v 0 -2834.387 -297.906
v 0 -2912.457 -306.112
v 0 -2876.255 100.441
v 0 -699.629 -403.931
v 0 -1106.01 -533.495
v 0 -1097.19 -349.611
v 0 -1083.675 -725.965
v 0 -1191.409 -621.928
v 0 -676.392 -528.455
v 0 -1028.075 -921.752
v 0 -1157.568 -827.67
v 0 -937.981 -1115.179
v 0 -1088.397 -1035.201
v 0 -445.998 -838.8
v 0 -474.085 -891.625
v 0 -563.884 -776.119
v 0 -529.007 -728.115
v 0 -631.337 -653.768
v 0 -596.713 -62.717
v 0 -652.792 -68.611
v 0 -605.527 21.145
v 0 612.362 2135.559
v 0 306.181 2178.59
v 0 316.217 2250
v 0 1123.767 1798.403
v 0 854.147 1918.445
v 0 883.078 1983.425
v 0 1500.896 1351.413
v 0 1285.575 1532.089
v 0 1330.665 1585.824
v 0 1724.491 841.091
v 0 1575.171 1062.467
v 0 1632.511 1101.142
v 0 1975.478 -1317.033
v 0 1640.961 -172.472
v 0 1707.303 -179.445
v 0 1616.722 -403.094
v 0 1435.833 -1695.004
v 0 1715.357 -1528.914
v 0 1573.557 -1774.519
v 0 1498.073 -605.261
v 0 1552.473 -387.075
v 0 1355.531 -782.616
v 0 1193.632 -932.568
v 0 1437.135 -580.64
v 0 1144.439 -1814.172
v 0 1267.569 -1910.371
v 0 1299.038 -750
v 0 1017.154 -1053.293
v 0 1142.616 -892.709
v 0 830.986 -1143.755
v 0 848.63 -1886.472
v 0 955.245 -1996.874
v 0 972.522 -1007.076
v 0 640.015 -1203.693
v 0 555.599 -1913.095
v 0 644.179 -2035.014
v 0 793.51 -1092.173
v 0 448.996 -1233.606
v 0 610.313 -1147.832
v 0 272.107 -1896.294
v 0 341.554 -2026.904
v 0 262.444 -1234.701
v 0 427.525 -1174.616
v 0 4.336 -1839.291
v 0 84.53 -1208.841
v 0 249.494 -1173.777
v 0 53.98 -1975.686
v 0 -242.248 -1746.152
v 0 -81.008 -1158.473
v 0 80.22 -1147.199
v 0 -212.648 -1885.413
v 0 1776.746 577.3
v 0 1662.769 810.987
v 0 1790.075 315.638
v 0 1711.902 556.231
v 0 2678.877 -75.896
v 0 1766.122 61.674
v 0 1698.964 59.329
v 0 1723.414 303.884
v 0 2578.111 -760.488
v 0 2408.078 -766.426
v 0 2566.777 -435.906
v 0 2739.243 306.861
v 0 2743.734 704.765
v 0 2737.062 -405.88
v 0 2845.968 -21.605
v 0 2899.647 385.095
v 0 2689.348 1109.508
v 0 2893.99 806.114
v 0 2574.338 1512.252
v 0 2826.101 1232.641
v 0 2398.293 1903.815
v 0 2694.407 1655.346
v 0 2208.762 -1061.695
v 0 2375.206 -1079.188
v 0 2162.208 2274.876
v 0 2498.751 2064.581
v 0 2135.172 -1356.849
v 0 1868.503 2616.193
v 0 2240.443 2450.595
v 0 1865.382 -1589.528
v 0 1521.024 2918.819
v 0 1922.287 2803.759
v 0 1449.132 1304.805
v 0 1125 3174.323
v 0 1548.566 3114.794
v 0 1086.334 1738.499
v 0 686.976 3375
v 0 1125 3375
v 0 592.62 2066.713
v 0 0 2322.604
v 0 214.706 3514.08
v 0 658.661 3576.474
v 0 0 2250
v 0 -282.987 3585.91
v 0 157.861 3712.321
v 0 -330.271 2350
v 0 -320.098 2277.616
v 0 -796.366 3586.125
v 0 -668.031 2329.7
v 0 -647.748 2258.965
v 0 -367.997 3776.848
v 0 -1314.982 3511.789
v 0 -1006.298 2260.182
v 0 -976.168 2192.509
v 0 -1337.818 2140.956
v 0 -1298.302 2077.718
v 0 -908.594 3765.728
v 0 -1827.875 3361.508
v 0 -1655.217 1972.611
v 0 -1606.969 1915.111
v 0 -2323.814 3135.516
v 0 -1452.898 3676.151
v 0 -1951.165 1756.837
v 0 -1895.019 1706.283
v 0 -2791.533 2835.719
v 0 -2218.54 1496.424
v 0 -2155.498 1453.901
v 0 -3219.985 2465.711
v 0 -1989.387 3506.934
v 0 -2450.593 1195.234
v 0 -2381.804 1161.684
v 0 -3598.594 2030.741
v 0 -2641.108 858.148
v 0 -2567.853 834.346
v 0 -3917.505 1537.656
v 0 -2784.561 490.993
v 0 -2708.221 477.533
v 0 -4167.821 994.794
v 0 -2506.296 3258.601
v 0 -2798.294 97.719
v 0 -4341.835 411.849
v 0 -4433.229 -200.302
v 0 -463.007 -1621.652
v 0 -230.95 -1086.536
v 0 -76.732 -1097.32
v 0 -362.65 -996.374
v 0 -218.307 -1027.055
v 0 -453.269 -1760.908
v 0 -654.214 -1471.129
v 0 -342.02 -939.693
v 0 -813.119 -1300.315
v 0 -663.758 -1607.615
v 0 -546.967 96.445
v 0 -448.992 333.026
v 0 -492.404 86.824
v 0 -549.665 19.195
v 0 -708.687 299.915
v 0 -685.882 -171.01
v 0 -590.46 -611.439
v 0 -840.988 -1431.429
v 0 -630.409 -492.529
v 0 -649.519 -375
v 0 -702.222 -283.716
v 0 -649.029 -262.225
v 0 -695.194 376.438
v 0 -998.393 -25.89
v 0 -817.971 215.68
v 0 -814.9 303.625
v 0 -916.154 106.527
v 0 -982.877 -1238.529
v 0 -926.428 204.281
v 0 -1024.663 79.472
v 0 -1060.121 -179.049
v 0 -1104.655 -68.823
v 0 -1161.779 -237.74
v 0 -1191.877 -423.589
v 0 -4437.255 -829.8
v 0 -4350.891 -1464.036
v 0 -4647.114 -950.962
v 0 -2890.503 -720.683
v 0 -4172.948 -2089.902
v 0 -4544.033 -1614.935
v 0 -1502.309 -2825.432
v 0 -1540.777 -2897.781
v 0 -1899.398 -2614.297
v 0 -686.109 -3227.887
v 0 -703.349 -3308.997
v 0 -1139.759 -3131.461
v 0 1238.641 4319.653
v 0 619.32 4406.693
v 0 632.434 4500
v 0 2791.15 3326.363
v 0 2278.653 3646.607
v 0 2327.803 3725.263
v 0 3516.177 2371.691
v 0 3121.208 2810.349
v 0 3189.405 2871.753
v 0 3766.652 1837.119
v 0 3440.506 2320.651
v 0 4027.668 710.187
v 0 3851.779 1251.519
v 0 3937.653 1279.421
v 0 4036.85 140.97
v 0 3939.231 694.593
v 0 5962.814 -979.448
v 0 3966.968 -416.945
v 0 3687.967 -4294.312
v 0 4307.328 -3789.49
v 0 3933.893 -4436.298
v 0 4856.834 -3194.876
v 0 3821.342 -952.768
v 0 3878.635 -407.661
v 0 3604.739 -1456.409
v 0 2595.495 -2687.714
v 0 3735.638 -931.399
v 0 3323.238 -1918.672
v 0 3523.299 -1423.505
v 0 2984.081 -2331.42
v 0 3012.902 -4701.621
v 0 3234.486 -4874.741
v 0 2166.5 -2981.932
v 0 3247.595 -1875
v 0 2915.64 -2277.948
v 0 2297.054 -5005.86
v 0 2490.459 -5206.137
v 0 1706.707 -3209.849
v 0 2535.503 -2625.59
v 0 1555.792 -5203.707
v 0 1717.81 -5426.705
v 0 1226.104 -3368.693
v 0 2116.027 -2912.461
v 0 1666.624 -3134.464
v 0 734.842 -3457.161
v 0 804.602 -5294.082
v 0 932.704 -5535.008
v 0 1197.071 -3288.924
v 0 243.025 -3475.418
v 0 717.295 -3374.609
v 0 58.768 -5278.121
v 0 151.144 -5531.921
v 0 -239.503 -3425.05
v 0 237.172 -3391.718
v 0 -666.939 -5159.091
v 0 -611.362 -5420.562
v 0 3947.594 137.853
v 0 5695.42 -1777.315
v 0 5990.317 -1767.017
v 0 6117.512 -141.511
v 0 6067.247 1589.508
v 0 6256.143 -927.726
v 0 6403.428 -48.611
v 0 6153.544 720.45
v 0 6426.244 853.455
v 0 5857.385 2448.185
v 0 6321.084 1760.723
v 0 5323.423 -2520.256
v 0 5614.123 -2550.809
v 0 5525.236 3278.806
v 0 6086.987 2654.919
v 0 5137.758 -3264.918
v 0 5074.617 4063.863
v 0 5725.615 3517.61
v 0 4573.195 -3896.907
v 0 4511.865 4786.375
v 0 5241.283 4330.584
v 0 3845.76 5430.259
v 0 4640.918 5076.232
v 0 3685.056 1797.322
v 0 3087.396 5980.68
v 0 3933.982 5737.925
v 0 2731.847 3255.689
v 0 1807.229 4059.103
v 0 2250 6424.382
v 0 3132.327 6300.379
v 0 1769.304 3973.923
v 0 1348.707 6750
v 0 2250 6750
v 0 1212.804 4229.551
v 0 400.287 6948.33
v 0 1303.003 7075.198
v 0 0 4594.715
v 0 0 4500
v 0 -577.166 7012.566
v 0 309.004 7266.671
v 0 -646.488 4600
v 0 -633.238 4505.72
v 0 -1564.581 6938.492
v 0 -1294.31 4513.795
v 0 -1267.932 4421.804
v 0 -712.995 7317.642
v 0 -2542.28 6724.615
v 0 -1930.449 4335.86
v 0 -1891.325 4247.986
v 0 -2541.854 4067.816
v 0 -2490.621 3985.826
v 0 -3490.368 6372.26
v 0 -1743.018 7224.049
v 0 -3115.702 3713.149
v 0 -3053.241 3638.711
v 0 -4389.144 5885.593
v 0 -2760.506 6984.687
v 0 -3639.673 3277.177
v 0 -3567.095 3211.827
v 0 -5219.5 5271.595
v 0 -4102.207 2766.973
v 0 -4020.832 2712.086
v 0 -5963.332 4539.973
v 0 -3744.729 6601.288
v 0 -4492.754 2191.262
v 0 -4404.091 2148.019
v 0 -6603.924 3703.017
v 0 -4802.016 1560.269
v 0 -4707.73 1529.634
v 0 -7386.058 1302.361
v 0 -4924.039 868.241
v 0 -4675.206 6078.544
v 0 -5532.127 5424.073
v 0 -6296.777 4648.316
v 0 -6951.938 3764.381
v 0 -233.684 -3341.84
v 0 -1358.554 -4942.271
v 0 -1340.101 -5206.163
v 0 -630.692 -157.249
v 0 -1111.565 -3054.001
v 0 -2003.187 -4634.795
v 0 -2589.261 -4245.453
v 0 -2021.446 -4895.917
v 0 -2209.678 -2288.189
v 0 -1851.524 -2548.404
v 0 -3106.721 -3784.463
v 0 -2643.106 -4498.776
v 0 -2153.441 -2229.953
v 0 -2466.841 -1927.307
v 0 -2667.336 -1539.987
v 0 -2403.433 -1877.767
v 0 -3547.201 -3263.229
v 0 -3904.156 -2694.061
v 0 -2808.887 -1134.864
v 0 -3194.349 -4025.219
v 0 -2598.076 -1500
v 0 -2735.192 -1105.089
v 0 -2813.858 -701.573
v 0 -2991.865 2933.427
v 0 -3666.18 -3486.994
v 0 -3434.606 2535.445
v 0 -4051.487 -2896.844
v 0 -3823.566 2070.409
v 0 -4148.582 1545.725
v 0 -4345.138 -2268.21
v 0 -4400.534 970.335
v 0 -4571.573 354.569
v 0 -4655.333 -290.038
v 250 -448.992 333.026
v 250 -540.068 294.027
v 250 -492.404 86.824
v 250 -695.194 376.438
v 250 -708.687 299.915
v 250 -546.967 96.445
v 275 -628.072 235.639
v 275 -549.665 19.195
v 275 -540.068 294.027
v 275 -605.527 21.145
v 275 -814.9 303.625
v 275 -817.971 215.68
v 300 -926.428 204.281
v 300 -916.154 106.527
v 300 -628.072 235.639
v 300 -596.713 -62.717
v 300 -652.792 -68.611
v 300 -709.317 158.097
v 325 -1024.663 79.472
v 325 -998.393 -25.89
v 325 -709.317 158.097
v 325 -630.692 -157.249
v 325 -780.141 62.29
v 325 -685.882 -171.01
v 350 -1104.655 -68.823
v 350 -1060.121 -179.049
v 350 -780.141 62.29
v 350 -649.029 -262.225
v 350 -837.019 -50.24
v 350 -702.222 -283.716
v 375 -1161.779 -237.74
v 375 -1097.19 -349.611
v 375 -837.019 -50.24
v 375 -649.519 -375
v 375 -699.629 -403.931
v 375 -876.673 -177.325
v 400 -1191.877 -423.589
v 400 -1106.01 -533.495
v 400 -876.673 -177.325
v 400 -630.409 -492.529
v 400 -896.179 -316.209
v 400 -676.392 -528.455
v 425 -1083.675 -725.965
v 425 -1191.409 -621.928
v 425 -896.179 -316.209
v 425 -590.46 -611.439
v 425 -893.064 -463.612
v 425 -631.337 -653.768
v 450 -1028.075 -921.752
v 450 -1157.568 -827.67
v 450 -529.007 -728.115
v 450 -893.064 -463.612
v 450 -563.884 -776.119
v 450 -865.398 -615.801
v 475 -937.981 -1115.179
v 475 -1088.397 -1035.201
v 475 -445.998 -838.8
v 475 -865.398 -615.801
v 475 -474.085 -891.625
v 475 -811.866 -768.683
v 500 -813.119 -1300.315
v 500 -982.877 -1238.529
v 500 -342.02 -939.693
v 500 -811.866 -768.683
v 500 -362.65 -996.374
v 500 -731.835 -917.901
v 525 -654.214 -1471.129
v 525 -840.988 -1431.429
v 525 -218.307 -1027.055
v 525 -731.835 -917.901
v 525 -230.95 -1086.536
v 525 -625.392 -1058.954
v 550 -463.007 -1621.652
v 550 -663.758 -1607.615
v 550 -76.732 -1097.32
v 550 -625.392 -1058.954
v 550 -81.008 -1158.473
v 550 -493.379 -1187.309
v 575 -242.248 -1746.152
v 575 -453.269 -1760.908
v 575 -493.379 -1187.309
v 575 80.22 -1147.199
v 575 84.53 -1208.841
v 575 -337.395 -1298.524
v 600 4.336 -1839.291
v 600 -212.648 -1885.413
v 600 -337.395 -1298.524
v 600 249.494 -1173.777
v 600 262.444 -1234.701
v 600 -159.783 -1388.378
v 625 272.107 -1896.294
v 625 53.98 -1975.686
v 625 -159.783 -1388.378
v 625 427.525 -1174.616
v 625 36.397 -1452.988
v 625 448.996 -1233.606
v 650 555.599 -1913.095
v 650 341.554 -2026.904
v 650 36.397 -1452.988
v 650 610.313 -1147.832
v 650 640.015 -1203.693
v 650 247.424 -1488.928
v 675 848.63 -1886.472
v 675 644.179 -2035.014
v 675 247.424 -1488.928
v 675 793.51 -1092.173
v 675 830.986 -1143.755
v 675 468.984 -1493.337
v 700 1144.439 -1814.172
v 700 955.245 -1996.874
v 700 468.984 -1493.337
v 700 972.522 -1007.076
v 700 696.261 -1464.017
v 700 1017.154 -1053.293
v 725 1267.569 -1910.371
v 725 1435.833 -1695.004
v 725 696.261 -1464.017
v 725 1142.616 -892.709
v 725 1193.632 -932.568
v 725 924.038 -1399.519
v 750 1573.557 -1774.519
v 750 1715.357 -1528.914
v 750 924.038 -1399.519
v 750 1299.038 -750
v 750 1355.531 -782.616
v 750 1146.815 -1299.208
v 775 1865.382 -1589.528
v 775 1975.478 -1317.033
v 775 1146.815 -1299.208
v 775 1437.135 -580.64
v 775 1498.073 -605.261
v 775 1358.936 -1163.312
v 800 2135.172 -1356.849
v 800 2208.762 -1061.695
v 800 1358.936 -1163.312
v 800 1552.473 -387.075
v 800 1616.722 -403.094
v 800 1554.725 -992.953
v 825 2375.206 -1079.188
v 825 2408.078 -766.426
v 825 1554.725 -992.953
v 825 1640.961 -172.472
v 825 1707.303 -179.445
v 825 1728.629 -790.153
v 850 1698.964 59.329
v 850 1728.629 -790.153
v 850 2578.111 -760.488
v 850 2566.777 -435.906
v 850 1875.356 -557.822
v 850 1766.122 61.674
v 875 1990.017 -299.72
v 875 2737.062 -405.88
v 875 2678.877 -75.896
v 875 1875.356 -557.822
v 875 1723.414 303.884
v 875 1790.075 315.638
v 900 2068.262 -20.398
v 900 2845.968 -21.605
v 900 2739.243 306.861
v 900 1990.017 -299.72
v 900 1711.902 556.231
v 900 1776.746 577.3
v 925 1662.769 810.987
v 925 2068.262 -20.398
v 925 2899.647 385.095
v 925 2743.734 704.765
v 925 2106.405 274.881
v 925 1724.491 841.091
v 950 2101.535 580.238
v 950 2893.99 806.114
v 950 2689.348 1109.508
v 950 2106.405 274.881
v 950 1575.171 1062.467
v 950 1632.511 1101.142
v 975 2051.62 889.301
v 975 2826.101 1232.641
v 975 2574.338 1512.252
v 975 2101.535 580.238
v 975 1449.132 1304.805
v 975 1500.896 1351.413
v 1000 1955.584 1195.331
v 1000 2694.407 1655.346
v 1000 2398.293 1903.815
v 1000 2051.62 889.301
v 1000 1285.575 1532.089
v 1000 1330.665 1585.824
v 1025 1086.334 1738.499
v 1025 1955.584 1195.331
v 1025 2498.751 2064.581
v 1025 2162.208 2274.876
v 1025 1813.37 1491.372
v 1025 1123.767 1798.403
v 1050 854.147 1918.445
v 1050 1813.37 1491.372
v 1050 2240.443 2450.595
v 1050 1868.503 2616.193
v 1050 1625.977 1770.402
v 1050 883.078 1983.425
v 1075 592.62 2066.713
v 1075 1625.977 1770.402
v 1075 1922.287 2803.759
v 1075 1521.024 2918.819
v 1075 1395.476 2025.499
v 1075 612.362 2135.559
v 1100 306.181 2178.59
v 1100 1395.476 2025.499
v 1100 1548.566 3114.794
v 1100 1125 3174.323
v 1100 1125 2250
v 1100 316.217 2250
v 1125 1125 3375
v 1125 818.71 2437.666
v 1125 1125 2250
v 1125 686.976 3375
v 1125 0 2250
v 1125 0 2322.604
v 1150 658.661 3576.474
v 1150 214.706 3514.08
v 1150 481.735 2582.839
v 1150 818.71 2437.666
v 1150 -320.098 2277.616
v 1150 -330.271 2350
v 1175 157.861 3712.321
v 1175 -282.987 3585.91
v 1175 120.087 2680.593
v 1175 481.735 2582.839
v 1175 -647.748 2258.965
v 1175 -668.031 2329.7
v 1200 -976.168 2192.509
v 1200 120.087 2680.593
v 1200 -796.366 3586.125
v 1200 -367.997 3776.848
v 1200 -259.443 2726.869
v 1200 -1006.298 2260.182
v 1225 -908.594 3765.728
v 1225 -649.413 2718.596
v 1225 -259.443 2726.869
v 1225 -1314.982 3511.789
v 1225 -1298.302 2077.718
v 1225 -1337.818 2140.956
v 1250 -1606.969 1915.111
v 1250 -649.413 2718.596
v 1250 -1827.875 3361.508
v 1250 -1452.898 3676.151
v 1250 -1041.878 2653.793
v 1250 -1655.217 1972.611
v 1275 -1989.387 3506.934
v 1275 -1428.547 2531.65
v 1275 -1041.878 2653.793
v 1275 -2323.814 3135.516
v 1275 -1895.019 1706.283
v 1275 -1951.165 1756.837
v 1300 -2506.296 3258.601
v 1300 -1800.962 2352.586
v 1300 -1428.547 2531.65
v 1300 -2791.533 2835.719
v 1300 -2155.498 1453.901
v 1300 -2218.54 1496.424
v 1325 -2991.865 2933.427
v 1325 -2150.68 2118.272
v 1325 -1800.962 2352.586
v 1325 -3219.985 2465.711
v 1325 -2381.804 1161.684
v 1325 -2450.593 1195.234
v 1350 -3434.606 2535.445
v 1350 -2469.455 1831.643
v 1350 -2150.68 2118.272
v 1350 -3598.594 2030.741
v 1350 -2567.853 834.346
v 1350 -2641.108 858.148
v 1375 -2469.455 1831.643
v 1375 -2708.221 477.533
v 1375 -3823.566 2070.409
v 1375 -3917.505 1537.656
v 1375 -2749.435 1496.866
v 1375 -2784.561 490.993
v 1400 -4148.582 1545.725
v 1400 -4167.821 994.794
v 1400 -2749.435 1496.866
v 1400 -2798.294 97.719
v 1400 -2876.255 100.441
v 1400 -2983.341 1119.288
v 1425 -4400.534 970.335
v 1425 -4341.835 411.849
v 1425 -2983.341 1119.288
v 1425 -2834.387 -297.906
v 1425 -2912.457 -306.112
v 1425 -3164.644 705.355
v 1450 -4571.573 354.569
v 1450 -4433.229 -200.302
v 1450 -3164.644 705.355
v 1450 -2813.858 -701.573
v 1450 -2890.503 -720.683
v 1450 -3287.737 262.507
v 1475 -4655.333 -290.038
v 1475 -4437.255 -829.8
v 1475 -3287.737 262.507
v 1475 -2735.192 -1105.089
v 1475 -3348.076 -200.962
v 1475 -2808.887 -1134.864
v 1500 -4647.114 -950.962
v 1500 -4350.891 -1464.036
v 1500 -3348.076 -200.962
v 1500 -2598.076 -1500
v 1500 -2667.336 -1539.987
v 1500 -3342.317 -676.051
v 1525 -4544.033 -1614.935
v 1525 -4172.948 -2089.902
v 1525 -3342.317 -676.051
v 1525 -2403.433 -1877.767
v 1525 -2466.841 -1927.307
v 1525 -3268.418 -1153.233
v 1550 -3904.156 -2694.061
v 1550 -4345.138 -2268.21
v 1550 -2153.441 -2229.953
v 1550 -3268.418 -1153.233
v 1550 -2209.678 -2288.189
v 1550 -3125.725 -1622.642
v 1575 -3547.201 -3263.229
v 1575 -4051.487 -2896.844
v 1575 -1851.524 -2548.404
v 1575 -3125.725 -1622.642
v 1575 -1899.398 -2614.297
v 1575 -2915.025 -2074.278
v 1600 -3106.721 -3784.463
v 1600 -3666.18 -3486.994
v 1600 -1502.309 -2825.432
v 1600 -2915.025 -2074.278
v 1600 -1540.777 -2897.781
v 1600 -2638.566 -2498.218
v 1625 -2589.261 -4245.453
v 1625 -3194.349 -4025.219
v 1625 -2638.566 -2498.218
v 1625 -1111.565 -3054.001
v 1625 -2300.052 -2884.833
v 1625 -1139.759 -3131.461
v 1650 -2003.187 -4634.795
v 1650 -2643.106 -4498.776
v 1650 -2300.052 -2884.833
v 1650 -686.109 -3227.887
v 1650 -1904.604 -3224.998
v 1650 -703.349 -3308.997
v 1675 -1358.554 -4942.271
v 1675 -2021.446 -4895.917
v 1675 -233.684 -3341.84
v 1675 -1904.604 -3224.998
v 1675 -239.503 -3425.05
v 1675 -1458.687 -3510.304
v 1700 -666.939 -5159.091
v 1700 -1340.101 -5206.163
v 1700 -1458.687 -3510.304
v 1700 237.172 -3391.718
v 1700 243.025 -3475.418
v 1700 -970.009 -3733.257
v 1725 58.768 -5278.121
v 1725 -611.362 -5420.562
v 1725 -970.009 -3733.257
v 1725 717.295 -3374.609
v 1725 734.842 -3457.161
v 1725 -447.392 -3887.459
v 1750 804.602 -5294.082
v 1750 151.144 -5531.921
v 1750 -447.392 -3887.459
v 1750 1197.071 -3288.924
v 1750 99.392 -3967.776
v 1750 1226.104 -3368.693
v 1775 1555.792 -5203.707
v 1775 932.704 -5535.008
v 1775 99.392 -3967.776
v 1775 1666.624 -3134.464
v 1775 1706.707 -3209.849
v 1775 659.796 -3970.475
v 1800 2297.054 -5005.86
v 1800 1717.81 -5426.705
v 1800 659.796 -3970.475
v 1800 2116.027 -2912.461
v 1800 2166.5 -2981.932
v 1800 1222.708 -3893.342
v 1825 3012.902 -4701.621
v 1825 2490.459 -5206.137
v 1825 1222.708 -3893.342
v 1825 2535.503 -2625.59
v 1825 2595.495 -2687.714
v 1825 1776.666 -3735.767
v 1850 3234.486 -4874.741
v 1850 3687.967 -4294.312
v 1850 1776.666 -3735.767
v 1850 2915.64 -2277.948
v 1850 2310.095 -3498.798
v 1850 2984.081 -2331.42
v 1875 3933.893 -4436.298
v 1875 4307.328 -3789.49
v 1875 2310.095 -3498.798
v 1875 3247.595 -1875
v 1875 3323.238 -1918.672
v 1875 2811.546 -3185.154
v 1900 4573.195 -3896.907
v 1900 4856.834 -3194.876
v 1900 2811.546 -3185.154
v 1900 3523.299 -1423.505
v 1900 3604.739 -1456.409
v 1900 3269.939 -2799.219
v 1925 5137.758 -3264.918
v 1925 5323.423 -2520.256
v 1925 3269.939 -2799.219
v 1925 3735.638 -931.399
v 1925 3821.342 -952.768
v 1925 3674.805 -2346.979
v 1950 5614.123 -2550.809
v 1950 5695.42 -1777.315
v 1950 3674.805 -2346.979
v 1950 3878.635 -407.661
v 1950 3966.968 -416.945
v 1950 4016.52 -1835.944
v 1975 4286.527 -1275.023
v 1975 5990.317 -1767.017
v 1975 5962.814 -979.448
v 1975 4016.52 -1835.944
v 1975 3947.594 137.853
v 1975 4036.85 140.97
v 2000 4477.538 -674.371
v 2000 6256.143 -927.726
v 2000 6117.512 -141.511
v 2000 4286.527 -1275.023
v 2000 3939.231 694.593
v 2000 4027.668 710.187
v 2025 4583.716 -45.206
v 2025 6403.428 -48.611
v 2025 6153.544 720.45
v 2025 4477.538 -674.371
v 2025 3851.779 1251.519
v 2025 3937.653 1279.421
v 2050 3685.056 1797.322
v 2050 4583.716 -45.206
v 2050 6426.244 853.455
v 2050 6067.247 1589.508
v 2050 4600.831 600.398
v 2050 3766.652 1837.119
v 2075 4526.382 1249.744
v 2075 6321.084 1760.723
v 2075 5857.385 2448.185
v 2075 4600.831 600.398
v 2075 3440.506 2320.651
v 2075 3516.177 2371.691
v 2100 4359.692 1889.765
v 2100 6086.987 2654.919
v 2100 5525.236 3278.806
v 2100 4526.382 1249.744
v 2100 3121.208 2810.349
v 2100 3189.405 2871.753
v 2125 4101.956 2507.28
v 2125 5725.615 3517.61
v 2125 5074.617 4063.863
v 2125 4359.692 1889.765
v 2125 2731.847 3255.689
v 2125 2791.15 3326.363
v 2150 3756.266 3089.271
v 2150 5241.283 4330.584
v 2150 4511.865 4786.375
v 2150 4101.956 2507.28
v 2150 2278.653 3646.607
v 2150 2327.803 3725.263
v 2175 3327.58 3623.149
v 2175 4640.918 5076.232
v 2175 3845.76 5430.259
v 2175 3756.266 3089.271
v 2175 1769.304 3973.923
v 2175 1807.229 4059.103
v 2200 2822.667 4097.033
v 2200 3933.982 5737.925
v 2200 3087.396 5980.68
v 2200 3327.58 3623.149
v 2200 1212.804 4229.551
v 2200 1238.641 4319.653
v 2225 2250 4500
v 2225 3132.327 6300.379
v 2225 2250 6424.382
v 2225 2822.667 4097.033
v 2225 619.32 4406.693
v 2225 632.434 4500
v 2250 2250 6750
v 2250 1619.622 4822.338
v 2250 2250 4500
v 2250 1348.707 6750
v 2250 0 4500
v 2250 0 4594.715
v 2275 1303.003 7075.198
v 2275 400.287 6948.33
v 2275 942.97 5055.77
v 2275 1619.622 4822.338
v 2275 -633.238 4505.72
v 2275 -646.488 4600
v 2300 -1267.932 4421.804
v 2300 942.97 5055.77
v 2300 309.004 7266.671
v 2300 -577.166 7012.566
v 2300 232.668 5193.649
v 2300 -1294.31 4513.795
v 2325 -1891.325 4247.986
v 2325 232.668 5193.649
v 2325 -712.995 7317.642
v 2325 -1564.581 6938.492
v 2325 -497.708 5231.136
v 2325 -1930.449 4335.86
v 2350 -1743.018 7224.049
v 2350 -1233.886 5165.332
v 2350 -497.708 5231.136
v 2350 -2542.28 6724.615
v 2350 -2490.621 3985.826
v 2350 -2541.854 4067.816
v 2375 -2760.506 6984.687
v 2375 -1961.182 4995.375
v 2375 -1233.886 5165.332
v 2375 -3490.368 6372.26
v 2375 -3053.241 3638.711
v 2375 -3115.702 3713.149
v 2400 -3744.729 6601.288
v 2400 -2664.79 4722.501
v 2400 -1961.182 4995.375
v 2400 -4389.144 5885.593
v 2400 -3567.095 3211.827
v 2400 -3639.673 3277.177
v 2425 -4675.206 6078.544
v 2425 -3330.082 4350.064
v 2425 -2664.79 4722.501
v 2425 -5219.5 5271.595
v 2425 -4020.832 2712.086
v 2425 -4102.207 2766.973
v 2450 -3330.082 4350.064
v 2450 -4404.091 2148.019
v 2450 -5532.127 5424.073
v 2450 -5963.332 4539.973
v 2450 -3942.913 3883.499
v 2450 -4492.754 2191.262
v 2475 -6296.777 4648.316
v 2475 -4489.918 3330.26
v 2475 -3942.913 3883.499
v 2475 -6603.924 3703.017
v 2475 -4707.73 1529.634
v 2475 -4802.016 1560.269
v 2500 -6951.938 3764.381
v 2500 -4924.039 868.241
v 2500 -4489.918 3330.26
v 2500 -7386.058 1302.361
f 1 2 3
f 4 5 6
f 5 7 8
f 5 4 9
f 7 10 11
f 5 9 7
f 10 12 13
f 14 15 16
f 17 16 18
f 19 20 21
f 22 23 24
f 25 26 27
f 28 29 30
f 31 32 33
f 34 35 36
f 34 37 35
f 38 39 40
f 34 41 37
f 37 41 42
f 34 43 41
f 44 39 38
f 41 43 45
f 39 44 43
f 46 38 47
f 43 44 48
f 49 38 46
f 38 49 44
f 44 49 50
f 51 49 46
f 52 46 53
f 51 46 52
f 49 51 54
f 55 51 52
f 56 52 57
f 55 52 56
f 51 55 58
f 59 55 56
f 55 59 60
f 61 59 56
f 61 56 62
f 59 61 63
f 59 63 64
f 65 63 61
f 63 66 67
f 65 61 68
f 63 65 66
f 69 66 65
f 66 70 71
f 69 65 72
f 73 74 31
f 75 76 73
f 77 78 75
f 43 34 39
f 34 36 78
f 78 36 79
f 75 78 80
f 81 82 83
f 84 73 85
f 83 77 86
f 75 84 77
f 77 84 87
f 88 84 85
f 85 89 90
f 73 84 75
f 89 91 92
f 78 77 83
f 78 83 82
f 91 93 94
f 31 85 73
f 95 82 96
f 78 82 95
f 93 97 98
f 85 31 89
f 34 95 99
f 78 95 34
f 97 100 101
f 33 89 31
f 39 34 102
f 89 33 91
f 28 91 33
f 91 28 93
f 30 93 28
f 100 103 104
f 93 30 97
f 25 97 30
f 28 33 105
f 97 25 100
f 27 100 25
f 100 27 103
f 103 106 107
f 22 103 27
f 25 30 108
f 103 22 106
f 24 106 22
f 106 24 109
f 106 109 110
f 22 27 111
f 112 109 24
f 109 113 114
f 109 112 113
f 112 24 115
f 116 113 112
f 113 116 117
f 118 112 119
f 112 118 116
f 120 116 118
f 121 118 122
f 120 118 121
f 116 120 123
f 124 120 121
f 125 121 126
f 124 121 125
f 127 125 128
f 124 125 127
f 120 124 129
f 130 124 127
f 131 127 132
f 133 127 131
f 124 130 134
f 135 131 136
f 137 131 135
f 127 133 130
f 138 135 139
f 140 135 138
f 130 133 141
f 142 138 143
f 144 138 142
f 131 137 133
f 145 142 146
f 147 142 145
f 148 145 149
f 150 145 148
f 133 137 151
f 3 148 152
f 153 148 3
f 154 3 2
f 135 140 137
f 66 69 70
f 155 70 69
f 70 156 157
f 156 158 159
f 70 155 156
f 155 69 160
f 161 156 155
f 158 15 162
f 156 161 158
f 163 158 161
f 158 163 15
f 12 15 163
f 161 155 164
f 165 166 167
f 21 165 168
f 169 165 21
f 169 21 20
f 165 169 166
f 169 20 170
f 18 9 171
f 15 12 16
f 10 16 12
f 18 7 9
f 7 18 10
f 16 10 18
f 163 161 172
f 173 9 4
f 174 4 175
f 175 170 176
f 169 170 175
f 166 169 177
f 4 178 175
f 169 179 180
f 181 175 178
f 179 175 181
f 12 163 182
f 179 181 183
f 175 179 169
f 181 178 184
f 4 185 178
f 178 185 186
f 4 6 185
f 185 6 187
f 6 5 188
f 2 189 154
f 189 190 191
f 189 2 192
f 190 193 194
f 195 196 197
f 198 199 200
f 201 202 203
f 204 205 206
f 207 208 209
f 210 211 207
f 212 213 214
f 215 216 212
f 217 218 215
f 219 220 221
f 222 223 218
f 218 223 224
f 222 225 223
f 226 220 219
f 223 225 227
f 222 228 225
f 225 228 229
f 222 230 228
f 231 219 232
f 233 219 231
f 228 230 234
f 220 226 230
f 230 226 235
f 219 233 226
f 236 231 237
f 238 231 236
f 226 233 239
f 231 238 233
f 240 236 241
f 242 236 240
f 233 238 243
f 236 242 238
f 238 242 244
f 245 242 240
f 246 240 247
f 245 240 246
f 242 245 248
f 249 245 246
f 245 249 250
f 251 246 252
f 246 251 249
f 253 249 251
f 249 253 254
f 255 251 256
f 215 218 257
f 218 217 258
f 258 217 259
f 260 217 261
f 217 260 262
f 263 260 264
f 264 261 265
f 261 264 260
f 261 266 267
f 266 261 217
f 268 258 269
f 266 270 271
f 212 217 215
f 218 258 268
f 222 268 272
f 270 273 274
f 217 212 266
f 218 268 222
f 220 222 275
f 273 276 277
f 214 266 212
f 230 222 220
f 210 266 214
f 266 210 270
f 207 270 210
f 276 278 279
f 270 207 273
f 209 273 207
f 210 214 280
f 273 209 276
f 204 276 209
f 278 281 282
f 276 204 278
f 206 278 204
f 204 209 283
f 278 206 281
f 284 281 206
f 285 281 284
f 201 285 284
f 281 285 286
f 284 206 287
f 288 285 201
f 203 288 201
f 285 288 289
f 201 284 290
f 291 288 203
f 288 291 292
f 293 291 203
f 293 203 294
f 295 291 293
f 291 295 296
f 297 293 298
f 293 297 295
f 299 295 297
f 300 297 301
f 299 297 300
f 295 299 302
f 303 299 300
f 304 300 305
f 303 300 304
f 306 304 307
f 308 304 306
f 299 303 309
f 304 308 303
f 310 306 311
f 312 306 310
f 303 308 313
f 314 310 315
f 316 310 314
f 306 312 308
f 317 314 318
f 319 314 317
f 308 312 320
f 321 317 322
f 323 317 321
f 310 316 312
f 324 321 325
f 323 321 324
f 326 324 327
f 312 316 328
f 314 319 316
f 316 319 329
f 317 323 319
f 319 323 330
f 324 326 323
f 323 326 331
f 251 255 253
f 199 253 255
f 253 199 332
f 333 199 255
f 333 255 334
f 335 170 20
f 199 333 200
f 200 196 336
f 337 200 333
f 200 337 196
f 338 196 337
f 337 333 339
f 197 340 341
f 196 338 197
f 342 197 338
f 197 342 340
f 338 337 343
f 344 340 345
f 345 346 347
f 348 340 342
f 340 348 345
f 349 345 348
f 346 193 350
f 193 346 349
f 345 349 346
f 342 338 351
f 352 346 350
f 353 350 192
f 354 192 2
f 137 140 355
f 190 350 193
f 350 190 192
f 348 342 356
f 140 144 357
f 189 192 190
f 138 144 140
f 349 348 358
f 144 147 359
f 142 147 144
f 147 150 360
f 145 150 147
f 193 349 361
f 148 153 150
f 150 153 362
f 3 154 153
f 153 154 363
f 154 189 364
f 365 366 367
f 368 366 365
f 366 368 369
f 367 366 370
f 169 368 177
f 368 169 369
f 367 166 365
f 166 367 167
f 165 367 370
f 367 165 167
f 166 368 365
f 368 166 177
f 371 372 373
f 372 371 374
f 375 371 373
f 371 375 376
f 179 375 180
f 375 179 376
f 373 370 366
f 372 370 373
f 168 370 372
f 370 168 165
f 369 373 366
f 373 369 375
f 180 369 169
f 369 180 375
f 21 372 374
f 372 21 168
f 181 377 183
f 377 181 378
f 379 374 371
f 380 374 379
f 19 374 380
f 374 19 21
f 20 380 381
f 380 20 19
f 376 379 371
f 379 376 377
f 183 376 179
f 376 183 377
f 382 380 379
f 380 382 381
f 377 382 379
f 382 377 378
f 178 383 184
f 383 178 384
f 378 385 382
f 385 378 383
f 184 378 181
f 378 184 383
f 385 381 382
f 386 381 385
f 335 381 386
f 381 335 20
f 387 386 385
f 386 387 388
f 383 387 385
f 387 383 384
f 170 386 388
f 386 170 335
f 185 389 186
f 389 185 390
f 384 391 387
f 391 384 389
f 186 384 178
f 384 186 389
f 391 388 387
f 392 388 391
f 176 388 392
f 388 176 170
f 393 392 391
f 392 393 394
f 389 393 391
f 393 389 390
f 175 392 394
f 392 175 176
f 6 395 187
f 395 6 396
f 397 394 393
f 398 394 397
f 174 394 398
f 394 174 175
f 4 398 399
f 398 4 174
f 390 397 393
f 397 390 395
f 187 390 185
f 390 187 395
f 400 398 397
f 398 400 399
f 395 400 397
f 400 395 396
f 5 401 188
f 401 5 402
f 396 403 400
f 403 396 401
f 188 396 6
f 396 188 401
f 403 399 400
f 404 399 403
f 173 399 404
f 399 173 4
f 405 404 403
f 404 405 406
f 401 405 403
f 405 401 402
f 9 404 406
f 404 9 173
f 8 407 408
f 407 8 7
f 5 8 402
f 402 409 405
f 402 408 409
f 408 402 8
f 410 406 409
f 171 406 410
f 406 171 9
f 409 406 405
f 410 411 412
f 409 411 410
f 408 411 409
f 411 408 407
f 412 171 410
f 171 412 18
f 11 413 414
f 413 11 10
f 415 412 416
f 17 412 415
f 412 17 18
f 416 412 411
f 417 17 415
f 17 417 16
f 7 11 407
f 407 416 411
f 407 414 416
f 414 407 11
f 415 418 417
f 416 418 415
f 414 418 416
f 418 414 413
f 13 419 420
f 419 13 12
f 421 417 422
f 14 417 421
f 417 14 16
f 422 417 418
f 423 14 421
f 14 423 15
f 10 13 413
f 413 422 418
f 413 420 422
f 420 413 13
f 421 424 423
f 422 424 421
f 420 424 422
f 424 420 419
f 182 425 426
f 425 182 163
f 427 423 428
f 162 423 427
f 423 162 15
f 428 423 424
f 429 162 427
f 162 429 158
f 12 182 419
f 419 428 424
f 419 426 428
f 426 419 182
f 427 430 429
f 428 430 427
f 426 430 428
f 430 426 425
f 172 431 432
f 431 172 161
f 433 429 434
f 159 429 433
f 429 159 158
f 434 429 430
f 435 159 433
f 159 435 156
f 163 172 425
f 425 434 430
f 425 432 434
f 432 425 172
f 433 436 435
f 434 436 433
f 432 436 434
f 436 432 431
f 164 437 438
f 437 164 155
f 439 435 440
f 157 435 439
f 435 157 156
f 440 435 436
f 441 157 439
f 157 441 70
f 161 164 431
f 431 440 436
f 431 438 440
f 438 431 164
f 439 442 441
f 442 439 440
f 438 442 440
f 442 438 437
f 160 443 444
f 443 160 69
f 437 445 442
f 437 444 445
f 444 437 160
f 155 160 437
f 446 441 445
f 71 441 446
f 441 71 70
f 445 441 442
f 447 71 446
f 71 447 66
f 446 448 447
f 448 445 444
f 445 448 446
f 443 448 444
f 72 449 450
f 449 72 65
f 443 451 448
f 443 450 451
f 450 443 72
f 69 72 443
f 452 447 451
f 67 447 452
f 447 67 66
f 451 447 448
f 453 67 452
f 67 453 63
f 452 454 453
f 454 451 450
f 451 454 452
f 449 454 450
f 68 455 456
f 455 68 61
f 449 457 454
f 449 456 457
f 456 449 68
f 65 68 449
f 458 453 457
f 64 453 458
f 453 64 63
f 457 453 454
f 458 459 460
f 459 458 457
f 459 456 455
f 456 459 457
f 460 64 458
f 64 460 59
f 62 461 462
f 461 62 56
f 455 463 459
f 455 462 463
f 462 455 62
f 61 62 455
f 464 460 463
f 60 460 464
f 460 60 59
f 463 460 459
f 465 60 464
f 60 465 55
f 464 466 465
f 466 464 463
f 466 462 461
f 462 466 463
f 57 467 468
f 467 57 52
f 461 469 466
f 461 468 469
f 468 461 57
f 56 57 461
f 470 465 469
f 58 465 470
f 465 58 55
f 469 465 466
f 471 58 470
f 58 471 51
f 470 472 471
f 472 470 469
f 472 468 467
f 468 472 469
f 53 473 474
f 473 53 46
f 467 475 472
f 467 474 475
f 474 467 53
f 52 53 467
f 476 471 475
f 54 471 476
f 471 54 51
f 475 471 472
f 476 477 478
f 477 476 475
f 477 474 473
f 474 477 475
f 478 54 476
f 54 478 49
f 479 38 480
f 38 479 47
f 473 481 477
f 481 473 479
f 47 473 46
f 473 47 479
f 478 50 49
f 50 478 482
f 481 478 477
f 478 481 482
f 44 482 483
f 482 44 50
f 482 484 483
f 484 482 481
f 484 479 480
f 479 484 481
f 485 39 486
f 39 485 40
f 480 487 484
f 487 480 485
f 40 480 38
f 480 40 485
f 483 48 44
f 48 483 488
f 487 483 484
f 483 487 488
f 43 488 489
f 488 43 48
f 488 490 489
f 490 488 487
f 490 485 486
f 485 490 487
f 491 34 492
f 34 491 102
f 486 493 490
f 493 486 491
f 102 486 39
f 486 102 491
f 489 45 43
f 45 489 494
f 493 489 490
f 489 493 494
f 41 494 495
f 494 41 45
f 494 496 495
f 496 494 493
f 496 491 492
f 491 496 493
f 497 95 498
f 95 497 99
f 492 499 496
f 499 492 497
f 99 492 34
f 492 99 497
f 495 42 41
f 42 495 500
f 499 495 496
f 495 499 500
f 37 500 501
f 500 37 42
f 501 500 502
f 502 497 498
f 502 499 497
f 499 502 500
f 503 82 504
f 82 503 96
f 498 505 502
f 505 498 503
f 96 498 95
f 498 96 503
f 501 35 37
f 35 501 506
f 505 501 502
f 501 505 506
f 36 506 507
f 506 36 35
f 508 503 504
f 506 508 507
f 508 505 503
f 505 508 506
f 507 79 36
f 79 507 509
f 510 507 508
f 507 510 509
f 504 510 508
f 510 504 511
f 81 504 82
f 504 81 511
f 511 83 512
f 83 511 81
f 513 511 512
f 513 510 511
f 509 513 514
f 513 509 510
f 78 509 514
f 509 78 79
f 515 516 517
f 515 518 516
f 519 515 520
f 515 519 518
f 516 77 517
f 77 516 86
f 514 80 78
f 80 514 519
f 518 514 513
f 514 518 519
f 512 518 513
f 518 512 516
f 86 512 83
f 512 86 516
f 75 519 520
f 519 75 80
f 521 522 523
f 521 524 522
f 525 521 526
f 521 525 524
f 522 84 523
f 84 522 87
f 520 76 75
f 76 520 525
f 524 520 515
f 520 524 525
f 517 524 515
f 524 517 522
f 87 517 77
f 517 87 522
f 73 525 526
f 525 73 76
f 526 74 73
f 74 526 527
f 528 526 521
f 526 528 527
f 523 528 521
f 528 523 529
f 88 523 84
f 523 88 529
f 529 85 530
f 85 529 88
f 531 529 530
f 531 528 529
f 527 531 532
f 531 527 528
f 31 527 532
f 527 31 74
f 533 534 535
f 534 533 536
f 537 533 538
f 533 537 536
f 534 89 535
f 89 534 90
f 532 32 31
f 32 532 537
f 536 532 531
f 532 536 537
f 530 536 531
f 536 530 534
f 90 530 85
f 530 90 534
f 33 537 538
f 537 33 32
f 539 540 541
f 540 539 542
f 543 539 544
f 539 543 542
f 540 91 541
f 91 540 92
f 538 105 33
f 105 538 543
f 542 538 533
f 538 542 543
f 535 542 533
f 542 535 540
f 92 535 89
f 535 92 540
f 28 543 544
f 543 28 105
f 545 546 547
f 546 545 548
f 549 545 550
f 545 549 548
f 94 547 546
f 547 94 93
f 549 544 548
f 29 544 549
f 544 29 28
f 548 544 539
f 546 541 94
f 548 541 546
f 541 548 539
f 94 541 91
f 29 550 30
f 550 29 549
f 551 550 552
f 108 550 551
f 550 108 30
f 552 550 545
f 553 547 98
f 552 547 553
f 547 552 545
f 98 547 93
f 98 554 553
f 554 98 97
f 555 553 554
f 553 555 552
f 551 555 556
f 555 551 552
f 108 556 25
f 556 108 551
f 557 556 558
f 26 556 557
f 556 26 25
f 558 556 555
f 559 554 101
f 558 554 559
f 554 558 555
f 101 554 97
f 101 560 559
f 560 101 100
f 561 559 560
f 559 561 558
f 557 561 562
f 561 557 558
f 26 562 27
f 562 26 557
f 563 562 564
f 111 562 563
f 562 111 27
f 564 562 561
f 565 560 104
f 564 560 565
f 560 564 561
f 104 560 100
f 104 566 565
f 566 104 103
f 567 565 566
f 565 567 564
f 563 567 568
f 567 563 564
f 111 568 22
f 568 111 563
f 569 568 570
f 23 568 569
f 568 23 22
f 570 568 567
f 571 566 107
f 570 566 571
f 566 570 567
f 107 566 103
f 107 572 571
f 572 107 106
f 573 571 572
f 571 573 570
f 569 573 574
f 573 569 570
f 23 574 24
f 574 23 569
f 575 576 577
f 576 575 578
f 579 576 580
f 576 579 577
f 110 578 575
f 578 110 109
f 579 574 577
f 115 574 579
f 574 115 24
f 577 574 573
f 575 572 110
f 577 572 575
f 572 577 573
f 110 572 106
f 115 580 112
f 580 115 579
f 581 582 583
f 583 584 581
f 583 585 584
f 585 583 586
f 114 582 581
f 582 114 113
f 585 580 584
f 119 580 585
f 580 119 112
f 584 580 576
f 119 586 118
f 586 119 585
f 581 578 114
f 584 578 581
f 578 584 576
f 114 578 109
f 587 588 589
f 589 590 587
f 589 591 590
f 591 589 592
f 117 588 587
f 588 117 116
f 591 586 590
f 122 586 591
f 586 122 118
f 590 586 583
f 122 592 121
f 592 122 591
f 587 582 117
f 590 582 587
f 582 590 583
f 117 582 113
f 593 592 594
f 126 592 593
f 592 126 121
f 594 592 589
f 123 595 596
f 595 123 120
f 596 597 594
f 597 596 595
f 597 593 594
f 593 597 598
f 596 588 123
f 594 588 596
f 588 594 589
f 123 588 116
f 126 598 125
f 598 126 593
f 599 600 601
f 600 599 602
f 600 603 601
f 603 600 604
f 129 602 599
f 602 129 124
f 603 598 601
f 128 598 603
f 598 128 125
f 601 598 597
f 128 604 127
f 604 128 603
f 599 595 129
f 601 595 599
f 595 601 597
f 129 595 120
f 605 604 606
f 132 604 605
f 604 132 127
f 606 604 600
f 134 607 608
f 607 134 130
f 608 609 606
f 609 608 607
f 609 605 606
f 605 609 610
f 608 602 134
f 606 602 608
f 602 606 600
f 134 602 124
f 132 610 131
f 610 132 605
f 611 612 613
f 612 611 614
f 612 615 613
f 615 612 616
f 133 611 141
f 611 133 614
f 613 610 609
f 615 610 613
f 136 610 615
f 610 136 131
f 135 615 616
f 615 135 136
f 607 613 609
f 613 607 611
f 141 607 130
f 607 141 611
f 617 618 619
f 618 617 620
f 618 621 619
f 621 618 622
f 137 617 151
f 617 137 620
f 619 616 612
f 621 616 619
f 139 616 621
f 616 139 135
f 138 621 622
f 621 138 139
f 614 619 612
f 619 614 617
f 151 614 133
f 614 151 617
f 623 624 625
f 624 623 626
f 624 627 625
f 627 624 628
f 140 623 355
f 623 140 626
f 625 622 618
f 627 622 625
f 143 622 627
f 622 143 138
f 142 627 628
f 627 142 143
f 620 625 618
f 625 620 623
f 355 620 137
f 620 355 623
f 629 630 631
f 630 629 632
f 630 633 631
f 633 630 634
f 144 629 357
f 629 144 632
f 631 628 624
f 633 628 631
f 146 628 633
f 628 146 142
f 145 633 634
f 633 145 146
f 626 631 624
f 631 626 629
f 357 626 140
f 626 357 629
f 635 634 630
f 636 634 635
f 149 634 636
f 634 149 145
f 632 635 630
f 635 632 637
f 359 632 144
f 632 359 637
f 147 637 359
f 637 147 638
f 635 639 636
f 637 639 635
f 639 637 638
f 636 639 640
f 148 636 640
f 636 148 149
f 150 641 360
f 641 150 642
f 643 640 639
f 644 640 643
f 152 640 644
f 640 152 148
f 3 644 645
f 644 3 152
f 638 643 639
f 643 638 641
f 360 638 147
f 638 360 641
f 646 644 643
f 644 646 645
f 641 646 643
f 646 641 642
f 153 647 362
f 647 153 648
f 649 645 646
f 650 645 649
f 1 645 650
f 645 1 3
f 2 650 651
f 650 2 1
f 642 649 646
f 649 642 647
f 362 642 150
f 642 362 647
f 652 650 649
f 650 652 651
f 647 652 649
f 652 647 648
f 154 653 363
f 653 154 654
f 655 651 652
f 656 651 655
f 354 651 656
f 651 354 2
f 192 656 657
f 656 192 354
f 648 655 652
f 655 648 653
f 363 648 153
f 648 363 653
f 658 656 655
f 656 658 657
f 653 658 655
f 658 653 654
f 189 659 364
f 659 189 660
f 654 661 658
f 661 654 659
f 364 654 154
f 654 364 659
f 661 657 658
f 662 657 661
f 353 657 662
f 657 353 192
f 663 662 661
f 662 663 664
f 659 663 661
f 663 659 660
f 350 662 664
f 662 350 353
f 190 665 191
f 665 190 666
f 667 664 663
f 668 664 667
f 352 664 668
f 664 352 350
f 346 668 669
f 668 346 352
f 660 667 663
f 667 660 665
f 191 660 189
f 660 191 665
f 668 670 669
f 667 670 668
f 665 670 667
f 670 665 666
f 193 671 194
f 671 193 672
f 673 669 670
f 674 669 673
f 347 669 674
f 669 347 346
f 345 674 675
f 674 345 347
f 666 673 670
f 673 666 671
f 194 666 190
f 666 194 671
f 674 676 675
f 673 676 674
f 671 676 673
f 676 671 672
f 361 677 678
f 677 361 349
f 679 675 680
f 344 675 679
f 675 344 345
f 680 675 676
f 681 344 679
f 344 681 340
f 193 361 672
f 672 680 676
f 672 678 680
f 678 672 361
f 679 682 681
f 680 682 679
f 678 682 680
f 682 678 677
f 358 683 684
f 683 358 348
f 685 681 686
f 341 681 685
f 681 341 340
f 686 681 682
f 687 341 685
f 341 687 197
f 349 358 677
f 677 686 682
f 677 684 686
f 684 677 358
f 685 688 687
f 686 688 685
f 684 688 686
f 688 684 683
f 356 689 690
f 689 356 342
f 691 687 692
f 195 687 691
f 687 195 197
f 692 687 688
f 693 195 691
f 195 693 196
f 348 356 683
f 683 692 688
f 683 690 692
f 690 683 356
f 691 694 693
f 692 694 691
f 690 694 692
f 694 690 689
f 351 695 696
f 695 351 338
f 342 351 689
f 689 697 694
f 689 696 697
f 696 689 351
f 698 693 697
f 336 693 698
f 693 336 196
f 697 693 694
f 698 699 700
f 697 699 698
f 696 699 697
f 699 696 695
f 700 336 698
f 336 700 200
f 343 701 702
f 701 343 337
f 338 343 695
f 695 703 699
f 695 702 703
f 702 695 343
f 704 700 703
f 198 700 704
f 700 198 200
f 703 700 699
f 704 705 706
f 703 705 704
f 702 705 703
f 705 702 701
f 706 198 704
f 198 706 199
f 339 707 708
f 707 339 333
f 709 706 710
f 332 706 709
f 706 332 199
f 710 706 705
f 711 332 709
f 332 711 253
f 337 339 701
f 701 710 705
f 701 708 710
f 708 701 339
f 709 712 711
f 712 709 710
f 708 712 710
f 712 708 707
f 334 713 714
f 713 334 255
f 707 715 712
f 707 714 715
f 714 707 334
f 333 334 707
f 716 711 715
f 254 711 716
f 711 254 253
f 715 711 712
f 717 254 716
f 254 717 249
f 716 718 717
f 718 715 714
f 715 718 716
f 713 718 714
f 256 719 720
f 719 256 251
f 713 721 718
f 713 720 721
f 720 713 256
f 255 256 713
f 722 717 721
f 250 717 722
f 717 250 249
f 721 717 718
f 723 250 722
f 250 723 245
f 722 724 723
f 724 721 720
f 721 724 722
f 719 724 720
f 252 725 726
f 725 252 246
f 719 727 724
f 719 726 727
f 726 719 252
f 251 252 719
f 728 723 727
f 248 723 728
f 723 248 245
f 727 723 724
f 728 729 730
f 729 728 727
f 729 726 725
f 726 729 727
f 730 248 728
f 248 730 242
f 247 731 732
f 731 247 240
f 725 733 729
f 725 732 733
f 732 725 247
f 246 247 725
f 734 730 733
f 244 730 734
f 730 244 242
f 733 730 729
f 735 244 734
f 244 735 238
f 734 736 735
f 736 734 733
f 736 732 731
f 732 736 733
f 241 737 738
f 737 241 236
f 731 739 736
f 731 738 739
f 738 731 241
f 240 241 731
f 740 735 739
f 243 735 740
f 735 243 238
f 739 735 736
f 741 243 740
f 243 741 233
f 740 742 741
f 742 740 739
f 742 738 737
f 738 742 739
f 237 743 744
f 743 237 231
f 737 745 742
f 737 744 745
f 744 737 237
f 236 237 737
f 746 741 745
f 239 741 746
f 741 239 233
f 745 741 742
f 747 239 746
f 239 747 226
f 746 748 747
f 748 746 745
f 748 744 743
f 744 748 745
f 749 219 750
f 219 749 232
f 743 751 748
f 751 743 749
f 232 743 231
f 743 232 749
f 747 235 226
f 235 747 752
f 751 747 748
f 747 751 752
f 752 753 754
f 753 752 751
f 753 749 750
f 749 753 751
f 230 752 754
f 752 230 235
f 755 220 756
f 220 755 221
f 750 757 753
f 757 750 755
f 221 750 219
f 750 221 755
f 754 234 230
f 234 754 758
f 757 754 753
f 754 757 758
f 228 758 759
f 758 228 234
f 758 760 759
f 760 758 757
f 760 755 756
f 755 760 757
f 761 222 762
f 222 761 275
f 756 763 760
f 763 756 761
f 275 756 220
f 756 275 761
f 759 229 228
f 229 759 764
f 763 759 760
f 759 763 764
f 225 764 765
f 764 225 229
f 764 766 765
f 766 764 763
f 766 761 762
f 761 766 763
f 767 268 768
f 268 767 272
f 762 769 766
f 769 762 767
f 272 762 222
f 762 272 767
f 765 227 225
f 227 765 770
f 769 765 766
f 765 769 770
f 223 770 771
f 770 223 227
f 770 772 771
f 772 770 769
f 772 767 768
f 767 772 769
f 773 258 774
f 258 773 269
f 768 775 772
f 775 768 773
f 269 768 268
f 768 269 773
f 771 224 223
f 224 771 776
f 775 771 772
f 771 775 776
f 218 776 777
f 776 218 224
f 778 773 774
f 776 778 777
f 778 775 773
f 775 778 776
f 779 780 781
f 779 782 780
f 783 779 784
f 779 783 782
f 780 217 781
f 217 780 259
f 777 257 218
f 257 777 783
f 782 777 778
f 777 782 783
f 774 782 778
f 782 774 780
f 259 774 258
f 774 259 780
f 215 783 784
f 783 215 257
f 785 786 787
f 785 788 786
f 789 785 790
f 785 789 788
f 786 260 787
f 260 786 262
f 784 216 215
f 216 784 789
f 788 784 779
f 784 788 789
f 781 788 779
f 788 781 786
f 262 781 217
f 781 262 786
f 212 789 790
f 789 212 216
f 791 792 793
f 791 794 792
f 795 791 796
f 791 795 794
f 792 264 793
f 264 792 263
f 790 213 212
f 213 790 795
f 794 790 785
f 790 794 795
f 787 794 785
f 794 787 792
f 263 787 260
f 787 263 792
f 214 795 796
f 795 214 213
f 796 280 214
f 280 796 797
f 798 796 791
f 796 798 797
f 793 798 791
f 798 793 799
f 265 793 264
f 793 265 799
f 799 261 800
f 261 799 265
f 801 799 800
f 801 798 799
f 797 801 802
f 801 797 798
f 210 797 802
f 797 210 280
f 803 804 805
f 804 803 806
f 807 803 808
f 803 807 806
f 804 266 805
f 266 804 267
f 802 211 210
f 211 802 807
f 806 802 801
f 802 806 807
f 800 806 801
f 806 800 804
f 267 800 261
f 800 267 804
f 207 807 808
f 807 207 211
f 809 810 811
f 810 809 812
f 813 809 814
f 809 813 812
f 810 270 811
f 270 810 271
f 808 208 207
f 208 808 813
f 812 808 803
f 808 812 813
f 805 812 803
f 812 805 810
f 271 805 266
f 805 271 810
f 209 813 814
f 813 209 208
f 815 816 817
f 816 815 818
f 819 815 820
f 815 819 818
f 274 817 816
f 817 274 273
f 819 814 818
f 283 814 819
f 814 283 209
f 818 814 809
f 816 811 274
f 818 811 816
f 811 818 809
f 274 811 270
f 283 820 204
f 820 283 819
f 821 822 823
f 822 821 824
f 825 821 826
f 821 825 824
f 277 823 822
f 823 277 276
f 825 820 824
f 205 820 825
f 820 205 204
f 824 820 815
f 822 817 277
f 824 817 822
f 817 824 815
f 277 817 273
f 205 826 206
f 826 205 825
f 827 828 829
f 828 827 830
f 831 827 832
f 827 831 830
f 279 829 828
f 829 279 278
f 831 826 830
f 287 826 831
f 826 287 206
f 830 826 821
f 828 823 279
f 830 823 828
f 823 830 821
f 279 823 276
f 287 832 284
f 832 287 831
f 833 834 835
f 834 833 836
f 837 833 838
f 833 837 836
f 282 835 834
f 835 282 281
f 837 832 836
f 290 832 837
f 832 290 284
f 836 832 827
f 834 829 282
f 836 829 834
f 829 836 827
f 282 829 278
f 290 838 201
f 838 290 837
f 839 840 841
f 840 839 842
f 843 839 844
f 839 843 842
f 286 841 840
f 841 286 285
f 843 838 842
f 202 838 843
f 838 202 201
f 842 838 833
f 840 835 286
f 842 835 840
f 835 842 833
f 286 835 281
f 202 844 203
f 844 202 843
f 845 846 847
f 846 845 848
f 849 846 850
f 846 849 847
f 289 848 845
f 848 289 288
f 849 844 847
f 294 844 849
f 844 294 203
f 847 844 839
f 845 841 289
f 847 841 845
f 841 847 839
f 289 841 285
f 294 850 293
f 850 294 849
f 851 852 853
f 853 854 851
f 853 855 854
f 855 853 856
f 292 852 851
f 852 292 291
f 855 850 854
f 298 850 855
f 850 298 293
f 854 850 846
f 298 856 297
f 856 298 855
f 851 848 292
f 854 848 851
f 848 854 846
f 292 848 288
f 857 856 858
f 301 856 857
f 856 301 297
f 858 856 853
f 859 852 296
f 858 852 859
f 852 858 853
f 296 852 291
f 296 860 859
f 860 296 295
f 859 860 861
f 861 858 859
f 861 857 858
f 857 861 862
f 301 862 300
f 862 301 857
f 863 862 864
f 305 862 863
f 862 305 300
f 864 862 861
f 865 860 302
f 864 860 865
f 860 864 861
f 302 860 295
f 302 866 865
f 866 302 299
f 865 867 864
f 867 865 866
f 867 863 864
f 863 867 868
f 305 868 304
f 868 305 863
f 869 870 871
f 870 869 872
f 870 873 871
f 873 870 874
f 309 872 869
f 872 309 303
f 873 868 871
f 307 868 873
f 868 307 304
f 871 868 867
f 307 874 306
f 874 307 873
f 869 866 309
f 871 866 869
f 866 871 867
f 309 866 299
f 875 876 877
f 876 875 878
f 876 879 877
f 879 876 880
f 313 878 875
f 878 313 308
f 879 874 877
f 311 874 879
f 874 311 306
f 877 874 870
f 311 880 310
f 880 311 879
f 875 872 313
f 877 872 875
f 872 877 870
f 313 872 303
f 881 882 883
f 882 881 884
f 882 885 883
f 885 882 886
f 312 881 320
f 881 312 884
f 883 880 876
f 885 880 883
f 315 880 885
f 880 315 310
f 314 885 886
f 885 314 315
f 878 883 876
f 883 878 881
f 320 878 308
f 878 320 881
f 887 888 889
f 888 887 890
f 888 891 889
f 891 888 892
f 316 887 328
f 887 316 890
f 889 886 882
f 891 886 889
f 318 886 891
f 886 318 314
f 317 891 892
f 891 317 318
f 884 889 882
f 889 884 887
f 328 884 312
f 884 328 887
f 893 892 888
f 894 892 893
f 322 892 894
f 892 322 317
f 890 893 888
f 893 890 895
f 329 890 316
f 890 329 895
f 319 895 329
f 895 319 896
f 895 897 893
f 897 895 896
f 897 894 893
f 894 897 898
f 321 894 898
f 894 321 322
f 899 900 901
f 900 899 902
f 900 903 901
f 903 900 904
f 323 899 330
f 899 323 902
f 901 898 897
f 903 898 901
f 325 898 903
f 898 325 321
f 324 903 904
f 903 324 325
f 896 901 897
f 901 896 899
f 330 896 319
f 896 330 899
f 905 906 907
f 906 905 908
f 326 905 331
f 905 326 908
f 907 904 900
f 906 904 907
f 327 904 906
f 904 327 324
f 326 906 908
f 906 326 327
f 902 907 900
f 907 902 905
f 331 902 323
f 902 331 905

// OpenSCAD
 for (i = [10:100])
   {
       angle = i*360/45;
       distance = i*10;
       r = i*25;
       {
       rotate(angle, [i,0,0])
       translate([0, 0, 5*distance])
       cube(r);         

//        translate([0.1*distance, 0.1*distance, 0.1*distance])
//        rotate(angle, [0, 0.1*i, 0])
//        cube(10,10,10);
        
//        rotate(angle, [1, -i, 1])
//        translate([0, distance, 0])
//        sphere(r);
           

    }
}
